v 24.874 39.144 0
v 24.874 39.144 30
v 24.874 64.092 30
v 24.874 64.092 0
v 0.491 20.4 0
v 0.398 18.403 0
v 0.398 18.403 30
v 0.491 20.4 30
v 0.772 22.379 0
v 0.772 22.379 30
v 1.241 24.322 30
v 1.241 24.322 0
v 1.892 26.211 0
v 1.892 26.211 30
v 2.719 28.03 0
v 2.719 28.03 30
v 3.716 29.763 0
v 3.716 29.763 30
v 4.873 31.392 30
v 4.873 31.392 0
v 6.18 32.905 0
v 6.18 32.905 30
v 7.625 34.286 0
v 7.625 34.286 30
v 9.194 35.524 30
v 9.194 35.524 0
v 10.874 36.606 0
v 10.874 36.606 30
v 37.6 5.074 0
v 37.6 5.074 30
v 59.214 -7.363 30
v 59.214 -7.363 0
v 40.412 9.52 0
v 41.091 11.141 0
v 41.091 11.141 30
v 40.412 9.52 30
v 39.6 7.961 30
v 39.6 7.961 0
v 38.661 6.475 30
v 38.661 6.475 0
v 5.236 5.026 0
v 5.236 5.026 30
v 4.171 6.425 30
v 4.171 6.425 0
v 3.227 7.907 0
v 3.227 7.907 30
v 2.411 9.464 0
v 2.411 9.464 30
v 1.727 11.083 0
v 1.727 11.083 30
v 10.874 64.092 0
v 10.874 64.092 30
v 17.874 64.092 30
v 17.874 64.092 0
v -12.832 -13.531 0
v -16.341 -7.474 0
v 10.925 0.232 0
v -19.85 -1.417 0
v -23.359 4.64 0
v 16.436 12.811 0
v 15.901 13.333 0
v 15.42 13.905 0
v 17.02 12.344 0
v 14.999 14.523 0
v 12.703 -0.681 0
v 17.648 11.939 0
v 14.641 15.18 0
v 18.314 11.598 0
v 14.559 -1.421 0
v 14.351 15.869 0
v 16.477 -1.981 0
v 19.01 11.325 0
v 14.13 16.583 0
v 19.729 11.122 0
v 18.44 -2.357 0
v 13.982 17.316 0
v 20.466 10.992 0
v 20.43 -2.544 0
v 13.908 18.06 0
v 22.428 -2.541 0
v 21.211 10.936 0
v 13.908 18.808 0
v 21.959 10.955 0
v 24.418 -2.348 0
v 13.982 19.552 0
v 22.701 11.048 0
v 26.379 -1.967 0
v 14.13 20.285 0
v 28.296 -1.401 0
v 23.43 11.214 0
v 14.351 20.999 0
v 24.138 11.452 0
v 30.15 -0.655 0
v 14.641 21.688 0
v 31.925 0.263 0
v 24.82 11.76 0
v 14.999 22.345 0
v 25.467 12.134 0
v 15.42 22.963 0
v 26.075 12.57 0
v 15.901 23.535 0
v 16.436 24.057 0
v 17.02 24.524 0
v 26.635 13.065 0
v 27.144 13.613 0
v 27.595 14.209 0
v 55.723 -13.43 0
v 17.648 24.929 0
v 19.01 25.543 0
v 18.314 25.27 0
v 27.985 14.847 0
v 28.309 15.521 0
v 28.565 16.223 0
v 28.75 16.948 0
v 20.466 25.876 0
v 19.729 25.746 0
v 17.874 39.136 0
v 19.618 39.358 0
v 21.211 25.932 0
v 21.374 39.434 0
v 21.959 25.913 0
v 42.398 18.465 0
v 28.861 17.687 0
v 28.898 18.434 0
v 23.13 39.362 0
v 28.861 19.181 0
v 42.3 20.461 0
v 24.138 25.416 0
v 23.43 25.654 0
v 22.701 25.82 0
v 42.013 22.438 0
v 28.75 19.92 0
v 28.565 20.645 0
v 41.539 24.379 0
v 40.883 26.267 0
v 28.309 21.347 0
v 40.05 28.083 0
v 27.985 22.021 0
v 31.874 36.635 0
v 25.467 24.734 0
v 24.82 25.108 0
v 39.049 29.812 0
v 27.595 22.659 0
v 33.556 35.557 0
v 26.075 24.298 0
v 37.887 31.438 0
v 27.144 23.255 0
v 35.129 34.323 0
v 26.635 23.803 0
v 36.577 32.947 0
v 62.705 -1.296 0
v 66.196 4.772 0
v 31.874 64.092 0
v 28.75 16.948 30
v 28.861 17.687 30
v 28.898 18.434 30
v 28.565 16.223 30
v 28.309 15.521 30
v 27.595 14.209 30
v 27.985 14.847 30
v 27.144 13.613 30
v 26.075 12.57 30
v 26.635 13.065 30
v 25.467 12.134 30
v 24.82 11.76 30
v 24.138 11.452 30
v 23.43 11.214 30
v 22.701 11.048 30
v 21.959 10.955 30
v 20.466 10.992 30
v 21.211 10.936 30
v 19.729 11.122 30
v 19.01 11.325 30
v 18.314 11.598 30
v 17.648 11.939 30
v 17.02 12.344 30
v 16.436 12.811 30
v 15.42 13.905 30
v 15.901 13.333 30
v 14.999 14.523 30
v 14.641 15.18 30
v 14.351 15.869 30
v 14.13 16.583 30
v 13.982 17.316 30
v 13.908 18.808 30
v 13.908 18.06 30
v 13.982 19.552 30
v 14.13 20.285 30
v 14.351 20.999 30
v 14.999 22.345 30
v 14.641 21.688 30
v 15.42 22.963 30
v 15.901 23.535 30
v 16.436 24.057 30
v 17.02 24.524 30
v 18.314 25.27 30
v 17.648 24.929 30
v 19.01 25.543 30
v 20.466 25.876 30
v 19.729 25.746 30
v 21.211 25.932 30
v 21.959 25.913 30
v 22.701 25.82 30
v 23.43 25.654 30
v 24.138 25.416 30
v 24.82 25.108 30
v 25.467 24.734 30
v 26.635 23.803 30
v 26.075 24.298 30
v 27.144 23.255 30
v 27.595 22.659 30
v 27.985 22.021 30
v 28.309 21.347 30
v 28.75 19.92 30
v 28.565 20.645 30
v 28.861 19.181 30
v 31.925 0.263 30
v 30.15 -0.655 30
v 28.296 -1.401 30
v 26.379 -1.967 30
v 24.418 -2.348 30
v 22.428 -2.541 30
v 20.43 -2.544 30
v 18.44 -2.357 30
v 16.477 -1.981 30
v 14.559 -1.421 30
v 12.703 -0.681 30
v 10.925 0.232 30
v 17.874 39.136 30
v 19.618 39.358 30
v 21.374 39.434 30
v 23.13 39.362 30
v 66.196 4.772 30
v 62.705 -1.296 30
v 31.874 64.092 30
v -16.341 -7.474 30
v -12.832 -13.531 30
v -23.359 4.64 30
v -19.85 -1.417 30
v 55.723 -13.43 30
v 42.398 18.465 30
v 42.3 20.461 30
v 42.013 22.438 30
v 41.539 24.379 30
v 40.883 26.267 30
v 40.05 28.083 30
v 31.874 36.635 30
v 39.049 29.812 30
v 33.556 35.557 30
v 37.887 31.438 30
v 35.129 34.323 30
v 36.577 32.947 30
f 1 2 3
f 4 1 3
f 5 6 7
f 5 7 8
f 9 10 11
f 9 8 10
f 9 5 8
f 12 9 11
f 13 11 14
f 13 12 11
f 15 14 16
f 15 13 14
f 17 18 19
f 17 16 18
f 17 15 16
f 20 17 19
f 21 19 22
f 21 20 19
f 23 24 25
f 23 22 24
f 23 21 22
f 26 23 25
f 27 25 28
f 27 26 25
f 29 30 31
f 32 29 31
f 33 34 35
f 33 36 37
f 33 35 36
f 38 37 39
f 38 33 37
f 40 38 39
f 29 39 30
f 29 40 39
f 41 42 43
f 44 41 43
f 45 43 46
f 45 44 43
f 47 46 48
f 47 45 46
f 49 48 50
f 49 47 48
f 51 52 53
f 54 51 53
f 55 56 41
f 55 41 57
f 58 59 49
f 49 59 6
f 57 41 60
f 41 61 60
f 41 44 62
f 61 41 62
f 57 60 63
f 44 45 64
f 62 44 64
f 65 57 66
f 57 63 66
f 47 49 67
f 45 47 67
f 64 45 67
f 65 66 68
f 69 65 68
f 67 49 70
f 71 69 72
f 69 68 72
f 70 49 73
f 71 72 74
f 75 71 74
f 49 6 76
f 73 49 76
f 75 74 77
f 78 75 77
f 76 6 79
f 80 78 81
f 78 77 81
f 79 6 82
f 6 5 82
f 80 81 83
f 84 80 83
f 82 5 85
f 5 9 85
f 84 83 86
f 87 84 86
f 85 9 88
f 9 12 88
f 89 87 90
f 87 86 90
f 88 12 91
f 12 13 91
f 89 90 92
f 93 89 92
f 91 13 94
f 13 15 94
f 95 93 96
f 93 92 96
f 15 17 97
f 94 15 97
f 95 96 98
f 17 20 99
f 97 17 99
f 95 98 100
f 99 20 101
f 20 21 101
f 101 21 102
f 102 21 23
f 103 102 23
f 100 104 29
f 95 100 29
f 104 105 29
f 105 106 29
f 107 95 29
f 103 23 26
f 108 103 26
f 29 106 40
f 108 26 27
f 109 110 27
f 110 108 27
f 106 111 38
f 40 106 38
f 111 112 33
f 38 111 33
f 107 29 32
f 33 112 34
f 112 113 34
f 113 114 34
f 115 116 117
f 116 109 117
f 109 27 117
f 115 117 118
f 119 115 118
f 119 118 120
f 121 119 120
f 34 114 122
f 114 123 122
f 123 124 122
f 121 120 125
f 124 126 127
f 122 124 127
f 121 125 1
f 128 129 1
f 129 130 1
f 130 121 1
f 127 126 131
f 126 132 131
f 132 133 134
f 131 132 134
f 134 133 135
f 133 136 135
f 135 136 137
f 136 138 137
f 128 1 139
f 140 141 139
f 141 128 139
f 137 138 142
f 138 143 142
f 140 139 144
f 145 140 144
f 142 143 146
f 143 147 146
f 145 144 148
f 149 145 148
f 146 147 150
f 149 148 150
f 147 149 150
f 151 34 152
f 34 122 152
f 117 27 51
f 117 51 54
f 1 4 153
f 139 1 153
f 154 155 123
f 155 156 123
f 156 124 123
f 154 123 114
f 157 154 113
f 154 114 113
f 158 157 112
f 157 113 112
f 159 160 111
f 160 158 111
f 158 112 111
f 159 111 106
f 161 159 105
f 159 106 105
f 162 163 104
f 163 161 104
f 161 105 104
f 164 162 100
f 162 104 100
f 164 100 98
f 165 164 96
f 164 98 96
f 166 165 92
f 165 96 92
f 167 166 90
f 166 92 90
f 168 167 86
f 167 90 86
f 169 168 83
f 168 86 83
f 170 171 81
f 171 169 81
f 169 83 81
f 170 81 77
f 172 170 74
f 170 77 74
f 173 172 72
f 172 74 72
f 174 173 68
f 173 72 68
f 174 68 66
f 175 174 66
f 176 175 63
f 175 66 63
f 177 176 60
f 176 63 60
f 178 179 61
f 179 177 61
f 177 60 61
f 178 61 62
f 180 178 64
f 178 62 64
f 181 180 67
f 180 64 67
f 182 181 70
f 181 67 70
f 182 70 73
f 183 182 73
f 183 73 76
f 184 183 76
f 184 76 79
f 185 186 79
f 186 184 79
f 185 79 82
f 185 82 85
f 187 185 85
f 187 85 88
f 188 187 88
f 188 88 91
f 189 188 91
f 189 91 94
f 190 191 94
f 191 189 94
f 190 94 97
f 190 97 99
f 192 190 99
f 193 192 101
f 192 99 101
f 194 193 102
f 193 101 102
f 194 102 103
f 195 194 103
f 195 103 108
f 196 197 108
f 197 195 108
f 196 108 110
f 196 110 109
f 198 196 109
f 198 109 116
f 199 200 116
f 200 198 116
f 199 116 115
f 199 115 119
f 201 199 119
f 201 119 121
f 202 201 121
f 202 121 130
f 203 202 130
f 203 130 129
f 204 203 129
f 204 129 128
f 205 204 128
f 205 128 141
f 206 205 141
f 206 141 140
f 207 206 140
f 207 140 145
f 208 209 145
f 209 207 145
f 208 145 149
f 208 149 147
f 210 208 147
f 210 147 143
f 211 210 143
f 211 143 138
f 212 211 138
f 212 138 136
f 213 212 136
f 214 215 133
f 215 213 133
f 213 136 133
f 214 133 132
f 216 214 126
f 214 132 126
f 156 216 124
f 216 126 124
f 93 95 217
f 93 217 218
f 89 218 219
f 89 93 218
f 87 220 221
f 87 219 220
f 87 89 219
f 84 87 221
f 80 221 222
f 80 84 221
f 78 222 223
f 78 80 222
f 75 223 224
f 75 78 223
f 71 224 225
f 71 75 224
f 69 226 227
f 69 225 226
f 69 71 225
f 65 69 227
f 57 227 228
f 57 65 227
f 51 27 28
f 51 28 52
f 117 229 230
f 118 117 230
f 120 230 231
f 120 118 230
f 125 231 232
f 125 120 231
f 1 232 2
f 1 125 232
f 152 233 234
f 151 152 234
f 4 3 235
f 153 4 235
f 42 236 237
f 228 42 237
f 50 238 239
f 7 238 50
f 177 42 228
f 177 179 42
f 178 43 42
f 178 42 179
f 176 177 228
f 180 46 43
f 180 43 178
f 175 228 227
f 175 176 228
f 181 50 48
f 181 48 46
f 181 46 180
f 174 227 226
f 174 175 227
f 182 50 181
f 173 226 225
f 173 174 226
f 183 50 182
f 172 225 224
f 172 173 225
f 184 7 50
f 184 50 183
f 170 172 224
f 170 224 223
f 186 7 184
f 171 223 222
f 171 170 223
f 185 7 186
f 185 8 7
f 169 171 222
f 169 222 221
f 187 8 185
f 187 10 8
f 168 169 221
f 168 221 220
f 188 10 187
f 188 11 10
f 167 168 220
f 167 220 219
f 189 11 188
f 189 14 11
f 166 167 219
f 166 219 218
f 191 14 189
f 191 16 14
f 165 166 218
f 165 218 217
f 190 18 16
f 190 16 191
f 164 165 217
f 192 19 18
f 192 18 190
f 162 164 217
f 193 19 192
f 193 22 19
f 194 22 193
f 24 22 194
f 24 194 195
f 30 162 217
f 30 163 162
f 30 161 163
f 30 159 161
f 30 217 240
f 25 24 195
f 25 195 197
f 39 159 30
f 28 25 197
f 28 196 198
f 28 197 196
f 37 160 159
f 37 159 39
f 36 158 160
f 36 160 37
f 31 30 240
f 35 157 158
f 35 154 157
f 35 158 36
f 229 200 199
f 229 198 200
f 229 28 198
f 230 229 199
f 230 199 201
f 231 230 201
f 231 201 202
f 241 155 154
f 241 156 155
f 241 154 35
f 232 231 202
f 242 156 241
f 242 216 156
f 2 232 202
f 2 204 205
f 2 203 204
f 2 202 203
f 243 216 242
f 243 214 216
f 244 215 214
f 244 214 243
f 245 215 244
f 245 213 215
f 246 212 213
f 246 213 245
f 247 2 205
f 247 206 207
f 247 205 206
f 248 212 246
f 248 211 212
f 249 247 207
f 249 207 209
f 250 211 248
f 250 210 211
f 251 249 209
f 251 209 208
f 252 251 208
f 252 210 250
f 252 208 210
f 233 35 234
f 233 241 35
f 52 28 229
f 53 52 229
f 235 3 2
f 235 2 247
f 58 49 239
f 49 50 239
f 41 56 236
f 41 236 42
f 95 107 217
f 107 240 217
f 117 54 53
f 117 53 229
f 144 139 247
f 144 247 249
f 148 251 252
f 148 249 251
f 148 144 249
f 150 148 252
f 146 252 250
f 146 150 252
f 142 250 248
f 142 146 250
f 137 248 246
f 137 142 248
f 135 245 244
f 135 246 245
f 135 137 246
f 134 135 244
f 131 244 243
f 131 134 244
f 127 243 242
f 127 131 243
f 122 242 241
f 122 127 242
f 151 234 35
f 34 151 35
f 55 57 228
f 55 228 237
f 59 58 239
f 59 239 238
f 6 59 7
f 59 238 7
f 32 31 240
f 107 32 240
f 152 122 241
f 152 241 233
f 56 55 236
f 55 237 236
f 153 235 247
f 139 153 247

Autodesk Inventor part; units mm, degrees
ref_plane "YZ Plane" through (0, 0, 0) normal (1, 0, 0) x (0, 1, 0)
ref_plane "XZ Plane" through (0, 0, 0) normal (0, 1, 0) x (-1, 0, 0)
ref_plane "XY Plane" through (0, 0, 0) normal (0, 0, 1) x (1, 0, 0)
sketch "Sketch1" plane through (0, 0, 0) normal (0, 0, 1) x (1, 0, 0)
  circle A0 centre (21.3984, 18.434) radius 21
  circle A1 centre (21.3984, 18.434) radius 7.5
  point P0 (0, 0)
  dimension "d0" = 42
  dimension "d1" = 15
extrude "Extrusion1" add sketch "Sketch1" along normal blind 30
sketch "Sketch2" plane through (21.3984, 18.434, 30) normal (0, 0, 1) x (1, 0, 0)
  circle A0 centre (0, 0) radius 21 projected
  line L0 (-10.5244, 16.6581) -> (-10.5244, 45.6581)
  line L1 (-10.5244, 45.6581) -> (-3.5244, 45.6581)
  line L2 (-3.5244, 45.6581) -> (-3.5244, 16.6581)
  line L3 (-3.5244, 16.6581) -> (3.4756, 16.6581)
  line L4 (3.4756, 16.6581) -> (3.4756, 45.6581)
  line L5 (3.4756, 45.6581) -> (10.4756, 45.6581)
  line L6 (10.4756, 45.6581) -> (10.4756, 16.6581)
  line L7 (10.4756, 16.6581) -> (-10.5244, 16.6581)
  line L8 (-9.1375, -17.4281) -> (-34.2309, -31.9649)
  line L9 (-34.2309, -31.9649) -> (-37.7398, -25.9078)
  line L10 (-37.7398, -25.9078) -> (-12.6464, -11.371)
  line L11 (-12.6464, -11.371) -> (-16.1552, -5.314)
  line L12 (-16.1552, -5.314) -> (-41.2487, -19.8508)
  line L13 (-41.2487, -19.8508) -> (-44.7576, -13.7938)
  line L14 (-44.7576, -13.7938) -> (-19.6641, 0.7431)
  line L15 (-19.6641, 0.7431) -> (-9.1375, -17.4281)
  line L16 (19.6619, 0.8008) -> (44.7979, -13.6624)
  line L17 (44.7979, -13.6624) -> (41.3067, -19.7297)
  line L18 (41.3067, -19.7297) -> (16.1708, -5.2666)
  line L19 (16.1708, -5.2666) -> (12.6797, -11.3339)
  line L20 (12.6797, -11.3339) -> (37.8156, -25.797)
  line L21 (37.8156, -25.797) -> (34.3245, -31.8643)
  line L22 (34.3245, -31.8643) -> (9.1886, -17.4012)
  line L23 (9.1886, -17.4012) -> (19.6619, 0.8008)
  point P0 (-21.3984, -18.434)
  point P1 (14.4252, -8.3002)
  point P2 (16.1708, -5.2666)
  point P3 (12.6797, -11.3339)
  point P4 (-16.1552, -5.314)
  point P5 (-3.5244, 16.6581)
  point P6 (3.4756, 16.6581)
  dimension "d6" = 29
  dimension "d7" = 7
  dimension "d8" = 29
  dimension "d9" = 7
  dimension "d10" = 29
  dimension "d11" = 7
  dimension "d12" = 29
  dimension "d13" = 45.6581
  dimension "d14" = 3.5244
  dimension "d15" = 29
  dimension "d16" = 7
  dimension "d17" = 29
  dimension "d18" = 7
  dimension "d19" = 29
  dimension "d20" = 7
  dimension "d21" = 29
  dimension "d26" = 29
  dimension "d27" = 7
  dimension "d28" = 29
  dimension "d29" = 7
  dimension "d30" = 29
  dimension "d31" = 7
  dimension "d32" = 29
  dimension "d33" = 29.916
  dimension "d34" = 30.084
  dimension "d35" = 34.3223
  dimension "d36" = 59.3205
  dimension "d37" = 44.8708
  dimension "d38" = 30.163
extrude "Extrusion2" add sketch "Sketch2" against normal blind 30 contours A0 L18 L23 L16 | A0 L16 L17 L18 | L6 L7 L4 A0 | A0 L4 L5 L6 | L20 L21 L22 A0 | A0 L22 L23 L20 | L2 L7 L0 A0 | A0 L0 L1 L2 | L8 L9 L10 A0 | A0 L10 L15 L8 | L14 L15 L12 A0 | A0 L12 L13 L14
properties part number "Rotor" material "Iron, Gray"
